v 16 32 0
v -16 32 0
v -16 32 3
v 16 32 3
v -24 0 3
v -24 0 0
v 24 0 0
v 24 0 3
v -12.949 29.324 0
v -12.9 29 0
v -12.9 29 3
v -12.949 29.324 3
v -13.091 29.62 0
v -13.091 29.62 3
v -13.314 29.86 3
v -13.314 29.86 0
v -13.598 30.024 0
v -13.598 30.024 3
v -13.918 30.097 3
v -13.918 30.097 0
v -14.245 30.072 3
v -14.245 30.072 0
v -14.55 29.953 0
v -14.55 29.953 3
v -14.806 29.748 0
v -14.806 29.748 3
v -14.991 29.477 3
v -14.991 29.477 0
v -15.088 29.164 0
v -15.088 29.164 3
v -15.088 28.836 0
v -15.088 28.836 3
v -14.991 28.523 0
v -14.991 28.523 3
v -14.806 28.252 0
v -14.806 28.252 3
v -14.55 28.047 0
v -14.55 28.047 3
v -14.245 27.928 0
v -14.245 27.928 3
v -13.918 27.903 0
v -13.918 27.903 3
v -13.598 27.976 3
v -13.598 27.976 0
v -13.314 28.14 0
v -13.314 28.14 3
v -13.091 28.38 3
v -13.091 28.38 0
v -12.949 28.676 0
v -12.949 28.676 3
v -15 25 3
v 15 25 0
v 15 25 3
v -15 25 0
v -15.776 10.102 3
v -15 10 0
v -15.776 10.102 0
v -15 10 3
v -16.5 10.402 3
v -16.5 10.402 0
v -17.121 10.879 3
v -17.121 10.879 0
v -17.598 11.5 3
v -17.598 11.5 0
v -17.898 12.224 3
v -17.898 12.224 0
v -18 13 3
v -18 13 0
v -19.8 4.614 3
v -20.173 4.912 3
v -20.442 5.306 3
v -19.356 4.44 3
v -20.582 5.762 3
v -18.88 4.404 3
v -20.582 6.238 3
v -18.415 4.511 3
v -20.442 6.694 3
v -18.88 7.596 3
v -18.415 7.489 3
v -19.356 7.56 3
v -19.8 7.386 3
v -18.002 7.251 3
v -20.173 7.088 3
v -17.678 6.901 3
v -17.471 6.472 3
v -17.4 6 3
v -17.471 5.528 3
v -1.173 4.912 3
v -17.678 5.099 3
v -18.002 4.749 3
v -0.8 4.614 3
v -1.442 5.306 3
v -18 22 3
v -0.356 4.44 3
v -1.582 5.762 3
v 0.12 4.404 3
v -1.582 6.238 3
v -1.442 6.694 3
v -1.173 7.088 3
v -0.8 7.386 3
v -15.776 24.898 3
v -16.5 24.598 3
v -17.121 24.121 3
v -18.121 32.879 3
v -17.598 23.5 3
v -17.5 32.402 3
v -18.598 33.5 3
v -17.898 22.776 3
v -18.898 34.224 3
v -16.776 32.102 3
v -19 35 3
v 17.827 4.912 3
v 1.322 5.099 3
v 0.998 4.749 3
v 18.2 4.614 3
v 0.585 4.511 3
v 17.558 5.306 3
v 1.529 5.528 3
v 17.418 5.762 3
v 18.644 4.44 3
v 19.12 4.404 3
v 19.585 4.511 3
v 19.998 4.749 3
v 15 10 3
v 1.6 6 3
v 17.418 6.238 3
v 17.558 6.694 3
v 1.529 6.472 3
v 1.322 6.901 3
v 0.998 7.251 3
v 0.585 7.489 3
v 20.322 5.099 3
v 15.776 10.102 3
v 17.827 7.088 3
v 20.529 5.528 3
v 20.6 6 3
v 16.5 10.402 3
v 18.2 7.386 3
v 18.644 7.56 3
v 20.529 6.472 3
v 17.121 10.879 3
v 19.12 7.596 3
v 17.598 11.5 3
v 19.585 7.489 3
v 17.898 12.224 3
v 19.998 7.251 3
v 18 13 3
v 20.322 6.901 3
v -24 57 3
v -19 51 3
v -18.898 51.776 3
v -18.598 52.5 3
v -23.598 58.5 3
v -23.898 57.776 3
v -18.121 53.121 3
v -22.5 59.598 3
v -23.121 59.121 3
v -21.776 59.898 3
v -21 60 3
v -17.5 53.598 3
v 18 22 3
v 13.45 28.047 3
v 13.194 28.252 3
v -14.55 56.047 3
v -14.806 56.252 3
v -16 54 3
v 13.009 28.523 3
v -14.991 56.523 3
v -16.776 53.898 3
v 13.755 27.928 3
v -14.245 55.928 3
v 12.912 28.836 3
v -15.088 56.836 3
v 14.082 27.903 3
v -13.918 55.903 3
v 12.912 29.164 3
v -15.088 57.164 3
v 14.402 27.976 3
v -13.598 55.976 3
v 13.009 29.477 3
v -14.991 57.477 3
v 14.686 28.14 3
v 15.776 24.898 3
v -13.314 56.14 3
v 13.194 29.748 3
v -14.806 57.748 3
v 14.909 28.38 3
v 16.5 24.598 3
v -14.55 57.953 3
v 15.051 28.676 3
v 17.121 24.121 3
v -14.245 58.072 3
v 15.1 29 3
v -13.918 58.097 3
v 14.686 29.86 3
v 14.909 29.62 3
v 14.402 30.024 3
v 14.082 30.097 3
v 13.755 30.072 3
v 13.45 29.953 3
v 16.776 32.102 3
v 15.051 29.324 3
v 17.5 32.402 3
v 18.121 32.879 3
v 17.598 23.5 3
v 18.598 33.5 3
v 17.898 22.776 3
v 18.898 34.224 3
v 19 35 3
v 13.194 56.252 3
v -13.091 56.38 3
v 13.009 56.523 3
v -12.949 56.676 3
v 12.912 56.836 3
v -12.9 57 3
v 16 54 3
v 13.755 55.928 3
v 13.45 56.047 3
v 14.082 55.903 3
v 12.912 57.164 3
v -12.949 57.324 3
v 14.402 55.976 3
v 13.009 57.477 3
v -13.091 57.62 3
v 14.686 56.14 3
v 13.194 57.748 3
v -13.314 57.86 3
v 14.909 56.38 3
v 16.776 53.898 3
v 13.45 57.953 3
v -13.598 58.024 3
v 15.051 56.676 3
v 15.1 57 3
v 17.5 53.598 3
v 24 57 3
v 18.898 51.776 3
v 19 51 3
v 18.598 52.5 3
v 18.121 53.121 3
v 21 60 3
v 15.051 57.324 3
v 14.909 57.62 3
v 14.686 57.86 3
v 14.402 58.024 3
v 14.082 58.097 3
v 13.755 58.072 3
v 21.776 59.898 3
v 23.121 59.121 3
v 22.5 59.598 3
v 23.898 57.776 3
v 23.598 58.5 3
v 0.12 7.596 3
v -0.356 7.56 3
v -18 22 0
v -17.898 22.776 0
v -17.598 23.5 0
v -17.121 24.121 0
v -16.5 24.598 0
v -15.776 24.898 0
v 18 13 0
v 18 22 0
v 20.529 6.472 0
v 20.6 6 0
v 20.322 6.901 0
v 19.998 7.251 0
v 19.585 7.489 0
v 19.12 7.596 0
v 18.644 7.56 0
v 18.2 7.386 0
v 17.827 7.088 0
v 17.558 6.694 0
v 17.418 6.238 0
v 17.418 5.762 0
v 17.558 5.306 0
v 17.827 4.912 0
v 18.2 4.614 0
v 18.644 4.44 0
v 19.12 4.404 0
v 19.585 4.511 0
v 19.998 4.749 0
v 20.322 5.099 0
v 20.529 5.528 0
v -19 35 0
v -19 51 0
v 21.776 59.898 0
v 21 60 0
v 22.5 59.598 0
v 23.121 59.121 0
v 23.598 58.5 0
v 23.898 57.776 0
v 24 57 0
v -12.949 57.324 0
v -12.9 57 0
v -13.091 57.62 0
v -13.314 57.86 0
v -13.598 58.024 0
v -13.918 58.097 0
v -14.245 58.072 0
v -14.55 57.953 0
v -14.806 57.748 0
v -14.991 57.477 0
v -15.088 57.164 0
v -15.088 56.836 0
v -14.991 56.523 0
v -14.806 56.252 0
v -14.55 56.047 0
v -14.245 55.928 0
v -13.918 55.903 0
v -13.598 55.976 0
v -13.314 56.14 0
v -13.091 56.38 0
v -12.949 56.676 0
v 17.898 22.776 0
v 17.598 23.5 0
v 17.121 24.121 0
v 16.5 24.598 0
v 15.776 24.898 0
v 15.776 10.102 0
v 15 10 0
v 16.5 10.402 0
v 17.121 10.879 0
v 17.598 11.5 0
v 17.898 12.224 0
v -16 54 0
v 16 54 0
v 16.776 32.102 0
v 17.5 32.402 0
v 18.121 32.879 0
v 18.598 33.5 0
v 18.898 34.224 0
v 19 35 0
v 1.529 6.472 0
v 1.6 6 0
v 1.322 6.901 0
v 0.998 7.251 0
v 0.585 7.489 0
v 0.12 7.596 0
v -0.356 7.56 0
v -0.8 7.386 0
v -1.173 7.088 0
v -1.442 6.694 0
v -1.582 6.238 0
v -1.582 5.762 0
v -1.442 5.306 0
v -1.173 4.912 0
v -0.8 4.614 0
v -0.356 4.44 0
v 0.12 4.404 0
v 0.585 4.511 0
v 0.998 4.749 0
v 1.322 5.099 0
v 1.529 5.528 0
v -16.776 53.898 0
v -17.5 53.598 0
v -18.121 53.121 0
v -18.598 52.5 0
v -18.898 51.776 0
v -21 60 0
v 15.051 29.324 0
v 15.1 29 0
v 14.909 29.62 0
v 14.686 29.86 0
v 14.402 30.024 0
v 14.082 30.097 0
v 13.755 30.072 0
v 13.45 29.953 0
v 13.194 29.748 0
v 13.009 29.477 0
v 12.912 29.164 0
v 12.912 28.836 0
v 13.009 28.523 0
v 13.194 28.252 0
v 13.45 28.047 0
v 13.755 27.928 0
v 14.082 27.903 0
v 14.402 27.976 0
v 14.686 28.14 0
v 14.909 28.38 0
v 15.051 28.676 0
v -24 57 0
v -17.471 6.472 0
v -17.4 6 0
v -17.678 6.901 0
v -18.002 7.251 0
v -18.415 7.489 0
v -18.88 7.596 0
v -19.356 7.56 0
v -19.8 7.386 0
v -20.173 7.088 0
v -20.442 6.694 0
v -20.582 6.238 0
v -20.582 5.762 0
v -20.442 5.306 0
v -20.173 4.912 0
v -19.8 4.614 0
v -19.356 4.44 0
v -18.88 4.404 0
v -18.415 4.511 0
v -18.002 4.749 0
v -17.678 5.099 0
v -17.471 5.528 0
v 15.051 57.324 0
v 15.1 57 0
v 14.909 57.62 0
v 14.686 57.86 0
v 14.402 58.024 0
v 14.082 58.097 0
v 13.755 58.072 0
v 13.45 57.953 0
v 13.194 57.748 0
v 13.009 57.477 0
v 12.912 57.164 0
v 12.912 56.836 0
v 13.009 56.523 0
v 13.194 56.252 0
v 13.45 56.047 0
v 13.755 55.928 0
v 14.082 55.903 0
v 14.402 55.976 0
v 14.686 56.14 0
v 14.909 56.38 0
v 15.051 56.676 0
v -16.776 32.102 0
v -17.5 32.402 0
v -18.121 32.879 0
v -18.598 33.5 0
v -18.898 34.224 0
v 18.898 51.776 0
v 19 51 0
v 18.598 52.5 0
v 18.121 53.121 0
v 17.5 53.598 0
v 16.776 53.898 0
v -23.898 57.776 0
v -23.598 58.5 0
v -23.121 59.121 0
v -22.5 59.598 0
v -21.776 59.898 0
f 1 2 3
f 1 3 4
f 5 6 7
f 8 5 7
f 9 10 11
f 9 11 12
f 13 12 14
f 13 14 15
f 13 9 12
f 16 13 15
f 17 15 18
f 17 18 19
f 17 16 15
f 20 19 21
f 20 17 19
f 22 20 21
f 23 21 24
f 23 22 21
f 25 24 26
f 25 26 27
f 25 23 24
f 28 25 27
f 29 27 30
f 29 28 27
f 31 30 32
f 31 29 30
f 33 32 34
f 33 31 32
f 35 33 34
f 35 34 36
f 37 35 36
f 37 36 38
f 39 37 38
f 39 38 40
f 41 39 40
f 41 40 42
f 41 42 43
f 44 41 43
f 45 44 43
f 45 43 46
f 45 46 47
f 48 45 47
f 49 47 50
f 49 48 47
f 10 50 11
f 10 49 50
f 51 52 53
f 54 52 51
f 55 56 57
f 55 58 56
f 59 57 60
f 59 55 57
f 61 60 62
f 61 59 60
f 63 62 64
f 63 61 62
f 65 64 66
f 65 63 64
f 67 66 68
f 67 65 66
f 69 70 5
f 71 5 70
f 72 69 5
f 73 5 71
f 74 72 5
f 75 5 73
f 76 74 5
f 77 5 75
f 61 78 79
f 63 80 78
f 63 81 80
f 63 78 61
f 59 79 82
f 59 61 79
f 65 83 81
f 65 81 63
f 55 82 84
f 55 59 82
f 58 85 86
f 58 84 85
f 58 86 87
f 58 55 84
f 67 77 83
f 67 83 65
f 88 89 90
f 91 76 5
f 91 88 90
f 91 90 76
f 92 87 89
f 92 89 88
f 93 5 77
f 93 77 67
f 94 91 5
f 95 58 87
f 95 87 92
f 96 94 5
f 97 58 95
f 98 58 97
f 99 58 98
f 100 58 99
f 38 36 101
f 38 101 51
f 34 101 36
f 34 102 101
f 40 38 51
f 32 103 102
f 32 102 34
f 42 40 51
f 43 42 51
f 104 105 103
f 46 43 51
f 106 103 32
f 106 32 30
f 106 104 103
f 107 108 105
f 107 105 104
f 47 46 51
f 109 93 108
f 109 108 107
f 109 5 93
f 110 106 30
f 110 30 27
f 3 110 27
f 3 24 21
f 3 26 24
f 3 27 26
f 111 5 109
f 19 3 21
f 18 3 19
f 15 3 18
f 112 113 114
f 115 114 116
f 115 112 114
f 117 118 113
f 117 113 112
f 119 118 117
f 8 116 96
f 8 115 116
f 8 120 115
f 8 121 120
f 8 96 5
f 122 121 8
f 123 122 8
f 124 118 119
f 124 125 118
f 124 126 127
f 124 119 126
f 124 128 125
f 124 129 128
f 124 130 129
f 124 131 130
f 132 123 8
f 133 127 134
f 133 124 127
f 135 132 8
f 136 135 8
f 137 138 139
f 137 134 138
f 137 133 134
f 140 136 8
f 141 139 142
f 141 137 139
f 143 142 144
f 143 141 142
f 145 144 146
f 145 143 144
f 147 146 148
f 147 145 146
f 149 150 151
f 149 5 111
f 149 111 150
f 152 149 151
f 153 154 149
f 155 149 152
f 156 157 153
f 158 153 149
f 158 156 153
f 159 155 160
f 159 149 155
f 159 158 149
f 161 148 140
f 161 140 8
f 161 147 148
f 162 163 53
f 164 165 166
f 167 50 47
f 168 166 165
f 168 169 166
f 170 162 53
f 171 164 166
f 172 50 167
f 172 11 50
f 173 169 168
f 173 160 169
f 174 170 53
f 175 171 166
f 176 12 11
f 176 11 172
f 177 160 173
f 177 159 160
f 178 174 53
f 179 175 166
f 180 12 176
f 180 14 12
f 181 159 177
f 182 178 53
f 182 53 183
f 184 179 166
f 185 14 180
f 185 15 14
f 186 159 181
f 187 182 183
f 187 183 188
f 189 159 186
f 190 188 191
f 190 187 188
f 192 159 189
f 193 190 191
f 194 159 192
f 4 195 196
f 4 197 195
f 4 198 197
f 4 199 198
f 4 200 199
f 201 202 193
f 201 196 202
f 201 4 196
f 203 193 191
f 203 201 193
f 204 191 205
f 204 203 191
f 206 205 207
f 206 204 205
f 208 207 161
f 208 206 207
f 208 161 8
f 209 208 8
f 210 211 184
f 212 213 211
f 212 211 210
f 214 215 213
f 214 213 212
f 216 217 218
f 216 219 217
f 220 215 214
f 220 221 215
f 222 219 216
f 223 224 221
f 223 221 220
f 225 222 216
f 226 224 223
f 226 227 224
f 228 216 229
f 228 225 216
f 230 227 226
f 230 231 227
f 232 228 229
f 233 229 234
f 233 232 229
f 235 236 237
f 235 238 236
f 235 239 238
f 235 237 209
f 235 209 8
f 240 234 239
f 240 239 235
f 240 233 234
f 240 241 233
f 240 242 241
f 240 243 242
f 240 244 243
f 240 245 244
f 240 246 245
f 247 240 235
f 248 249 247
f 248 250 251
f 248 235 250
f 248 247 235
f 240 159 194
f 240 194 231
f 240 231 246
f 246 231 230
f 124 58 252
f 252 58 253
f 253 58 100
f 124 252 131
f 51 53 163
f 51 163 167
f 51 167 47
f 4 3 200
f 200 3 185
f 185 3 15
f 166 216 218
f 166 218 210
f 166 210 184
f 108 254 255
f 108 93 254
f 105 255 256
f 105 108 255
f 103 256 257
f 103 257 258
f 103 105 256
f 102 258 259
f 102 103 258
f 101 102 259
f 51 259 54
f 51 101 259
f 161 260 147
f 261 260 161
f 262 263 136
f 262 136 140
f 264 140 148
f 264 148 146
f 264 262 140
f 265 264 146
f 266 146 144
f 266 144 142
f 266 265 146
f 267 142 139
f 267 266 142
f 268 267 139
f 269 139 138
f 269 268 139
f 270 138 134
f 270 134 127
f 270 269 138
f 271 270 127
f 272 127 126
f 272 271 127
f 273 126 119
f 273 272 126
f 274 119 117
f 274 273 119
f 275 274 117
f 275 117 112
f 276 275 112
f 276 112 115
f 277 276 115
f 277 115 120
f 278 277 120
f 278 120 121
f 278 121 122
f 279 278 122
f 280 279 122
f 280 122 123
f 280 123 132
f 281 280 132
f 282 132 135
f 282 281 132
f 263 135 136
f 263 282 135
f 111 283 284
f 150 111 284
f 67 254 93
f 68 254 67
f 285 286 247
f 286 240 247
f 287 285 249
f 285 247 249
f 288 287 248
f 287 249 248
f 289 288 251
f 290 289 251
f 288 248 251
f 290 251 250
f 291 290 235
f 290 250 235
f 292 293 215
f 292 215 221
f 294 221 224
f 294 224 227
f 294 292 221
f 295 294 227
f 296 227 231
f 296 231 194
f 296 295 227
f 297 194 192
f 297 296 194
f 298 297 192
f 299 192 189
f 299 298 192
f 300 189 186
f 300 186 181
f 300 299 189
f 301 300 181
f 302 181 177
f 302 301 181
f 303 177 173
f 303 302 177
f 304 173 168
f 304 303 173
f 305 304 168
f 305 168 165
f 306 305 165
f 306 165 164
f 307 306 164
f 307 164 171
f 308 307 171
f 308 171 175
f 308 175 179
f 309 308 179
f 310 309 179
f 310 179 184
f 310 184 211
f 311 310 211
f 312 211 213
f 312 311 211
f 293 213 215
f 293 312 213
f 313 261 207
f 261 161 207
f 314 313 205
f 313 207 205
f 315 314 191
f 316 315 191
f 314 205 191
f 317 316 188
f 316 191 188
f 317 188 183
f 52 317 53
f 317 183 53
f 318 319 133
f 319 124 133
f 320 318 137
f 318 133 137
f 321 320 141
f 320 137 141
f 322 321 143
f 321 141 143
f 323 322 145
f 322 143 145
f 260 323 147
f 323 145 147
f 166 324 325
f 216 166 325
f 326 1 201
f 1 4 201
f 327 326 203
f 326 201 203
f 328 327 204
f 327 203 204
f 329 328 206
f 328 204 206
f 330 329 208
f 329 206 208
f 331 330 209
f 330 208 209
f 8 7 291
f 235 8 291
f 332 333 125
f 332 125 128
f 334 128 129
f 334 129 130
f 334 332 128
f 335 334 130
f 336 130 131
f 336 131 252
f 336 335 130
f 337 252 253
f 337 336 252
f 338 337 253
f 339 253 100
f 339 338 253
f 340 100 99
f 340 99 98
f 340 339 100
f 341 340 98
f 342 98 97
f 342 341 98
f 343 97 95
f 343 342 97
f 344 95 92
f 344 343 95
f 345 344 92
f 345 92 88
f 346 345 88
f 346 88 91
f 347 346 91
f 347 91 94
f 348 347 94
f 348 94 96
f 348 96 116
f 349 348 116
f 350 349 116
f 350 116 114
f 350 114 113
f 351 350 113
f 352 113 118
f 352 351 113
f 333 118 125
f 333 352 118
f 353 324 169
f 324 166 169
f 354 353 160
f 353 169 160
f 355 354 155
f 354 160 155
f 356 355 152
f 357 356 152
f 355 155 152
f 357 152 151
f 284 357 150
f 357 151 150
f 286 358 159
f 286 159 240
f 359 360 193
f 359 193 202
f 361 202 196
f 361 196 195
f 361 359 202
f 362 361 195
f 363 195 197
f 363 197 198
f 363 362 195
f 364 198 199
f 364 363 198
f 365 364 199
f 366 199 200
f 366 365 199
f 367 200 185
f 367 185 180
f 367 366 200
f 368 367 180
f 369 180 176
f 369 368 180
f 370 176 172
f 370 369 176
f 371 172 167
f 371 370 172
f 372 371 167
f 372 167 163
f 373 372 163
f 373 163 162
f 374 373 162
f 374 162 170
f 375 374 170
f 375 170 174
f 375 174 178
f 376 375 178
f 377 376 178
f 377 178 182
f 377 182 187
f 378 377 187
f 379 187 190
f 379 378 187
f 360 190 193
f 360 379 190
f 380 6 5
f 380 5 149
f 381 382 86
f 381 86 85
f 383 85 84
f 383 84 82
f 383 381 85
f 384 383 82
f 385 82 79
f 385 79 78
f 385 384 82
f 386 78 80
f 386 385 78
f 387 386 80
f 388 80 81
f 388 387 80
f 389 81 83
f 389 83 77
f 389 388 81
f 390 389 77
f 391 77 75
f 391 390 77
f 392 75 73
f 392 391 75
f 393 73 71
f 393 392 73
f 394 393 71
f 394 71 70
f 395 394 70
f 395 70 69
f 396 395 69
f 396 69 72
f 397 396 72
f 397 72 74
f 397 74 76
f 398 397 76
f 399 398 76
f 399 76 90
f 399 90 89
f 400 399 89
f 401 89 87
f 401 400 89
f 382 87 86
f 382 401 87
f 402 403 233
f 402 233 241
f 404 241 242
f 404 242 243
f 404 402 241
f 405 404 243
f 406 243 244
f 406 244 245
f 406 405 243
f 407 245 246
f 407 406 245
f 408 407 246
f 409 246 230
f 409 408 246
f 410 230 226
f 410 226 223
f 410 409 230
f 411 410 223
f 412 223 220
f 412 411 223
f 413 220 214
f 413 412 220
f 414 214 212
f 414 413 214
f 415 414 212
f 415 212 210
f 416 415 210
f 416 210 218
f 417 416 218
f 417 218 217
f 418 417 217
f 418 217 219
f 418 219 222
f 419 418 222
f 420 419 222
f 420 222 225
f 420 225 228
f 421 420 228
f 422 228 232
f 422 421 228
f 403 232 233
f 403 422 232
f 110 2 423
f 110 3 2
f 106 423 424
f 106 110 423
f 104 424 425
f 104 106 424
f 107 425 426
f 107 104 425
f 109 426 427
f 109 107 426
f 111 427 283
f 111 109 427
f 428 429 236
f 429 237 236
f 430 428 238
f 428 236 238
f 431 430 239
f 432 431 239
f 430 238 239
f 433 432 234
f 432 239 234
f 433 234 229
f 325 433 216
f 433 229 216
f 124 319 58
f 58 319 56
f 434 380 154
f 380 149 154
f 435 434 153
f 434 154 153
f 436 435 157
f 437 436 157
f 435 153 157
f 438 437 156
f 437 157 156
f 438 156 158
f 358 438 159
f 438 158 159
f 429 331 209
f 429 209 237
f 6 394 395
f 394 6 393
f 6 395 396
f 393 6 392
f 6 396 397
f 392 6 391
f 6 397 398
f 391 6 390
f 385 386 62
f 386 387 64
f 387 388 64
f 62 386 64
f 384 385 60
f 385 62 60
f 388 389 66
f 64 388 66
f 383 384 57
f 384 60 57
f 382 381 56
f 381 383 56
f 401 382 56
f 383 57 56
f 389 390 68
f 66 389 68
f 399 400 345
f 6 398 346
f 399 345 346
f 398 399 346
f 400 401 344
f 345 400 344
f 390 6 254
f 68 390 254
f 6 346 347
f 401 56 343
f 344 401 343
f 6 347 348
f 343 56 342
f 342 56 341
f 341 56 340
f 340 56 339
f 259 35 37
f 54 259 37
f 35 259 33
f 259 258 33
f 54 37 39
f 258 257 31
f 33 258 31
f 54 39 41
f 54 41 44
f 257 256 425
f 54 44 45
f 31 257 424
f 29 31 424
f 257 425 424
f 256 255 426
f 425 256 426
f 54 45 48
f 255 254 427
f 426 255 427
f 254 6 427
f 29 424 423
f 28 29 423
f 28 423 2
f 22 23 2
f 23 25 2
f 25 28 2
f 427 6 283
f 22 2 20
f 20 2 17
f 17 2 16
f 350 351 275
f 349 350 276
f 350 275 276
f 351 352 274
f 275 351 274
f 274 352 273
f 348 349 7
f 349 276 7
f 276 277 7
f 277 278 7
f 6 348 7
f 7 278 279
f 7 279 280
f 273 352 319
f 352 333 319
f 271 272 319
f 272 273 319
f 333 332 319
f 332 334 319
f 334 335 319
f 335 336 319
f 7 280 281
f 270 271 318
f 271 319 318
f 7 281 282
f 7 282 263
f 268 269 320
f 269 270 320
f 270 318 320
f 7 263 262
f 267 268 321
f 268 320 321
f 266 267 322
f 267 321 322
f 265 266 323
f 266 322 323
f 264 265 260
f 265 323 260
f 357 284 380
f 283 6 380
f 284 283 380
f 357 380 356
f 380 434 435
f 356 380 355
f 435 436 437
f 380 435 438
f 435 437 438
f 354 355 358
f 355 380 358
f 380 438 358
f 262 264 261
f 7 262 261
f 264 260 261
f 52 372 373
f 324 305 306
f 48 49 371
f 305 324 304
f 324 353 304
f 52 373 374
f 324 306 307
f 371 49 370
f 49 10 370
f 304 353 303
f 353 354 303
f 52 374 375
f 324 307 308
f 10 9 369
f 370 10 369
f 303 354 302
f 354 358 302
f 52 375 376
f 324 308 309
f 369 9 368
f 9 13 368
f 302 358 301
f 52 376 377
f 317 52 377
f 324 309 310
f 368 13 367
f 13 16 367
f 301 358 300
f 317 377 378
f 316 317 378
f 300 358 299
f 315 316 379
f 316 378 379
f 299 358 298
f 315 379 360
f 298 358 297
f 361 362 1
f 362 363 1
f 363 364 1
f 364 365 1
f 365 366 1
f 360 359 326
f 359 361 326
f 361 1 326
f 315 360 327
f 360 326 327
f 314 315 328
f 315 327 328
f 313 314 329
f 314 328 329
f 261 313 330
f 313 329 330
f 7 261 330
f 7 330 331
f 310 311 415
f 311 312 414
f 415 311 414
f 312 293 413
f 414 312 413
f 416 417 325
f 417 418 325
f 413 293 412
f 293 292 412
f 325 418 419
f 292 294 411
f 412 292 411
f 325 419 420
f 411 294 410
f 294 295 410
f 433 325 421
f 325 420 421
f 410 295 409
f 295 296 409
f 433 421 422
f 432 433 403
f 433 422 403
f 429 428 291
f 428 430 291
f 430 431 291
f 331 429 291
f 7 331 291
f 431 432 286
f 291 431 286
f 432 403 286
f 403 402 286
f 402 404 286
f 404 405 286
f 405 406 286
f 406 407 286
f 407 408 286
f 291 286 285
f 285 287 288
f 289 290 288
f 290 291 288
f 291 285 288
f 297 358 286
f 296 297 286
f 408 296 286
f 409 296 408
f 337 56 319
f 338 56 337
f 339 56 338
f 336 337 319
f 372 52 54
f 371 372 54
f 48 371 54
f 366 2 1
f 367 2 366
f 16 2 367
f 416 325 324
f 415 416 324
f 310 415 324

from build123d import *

# Parameters (mm, degrees)
SKETCH_1_W      = 48
SKETCH_1_H      = 60
SKETCH_1_R      = 1.6
SKETCH_1_R_2    = 1.1
SKETCH_1_W_2    = 38
SKETCH_1_H_2    = 22
EXTRUDE_1_DEPTH = 3
FILLET_1_R      = 3
FILLET_2_R      = 3


with BuildPart() as part:
    # 草图1 → 凸台-拉伸1 (new body)
    with BuildSketch(Plane.XY):
        with Locations((0, 30)):
            Rectangle(SKETCH_1_W, SKETCH_1_H)
        with Locations((0, 6)):
            Circle(SKETCH_1_R, mode=Mode.SUBTRACT)
        with Locations((-19, 6)):
            Circle(SKETCH_1_R, mode=Mode.SUBTRACT)
        with Locations((19, 6)):
            Circle(SKETCH_1_R, mode=Mode.SUBTRACT)
        with Locations((-14, 57)):
            Circle(SKETCH_1_R_2, mode=Mode.SUBTRACT)
        with Locations((-14, 29)):
            Circle(SKETCH_1_R_2, mode=Mode.SUBTRACT)
        with Locations((14, 57)):
            Circle(SKETCH_1_R_2, mode=Mode.SUBTRACT)
        with Locations((14, 29)):
            Circle(SKETCH_1_R_2, mode=Mode.SUBTRACT)
        Polygon((-18, 10), (-3.79137849, 10), (3.79137849, 10), (18, 10), (18, 25), (-18, 25), align=None, mode=Mode.SUBTRACT)
        with Locations((0, 43)):
            Rectangle(SKETCH_1_W_2, SKETCH_1_H_2, mode=Mode.SUBTRACT)
    extrude(amount=EXTRUDE_1_DEPTH)

    # 圆角1
    fillet_1_edges = [part.edges().sort_by_distance(p)[0] for p in [
        (19, 32, 1.5),
        (19, 54, 1.5),
        (-19, 54, 1.5),
        (-19, 32, 1.5),
        (-24, 60, 1.5),
        (24, 60, 1.5),
    ]]
    fillet(fillet_1_edges, radius=FILLET_1_R)

    # 圆角2
    fillet_2_edges = [part.edges().sort_by_distance(p)[0] for p in [
        (-18, 25, 1.5),
        (-18, 10, 1.5),
        (18, 10, 1.5),
        (18, 25, 1.5),
    ]]
    fillet(fillet_2_edges, radius=FILLET_2_R)


solid = part.part
